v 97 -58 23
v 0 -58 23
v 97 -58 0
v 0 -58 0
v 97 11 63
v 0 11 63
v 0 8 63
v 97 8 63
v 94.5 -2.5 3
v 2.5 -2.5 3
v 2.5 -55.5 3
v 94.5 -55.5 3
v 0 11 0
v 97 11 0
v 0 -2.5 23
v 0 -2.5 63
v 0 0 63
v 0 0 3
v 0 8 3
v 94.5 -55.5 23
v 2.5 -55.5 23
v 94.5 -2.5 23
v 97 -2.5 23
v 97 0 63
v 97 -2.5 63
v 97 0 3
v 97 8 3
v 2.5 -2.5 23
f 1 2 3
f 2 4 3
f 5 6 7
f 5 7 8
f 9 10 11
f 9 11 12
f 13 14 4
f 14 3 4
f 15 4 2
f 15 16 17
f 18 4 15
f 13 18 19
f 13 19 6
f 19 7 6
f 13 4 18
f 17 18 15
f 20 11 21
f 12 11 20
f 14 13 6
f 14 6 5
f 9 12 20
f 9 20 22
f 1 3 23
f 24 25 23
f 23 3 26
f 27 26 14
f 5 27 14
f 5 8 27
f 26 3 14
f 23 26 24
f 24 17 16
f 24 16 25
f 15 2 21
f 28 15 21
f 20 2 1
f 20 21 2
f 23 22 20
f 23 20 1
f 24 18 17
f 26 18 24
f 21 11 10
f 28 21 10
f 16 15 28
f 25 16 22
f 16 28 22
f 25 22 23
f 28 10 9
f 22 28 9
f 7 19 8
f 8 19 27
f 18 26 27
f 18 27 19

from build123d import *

# Parameters (mm, degrees)
F0_W     = 97
F0_H     = 58
F1_DEPTH = 3
F2_W     = 97
F2_H     = 58
F2_W_2   = 92
F2_H_2   = 53
F3_DEPTH = 20
F4_W     = 97
F4_H     = 3
F5_DEPTH = 11
F6_W     = 97
F6_H     = 2.5
F7_DEPTH = 40
F8_W     = 97
F8_H     = 3
F9_DEPTH = 60


with BuildPart() as f1:
    # F0 (on Top) → F1 (new body)
    with BuildSketch(Plane.XY):
        with Locations((48.5, -29)):
            Rectangle(F0_W, F0_H)
    extrude(amount=F1_DEPTH)

    # F2 (on face) → F3 (join)
    with BuildSketch(Plane.XY.offset(3)):
        with Locations((48.5, -29)):
            Rectangle(F2_W, F2_H)
        with Locations((48.5, -29)):
            Rectangle(F2_W_2, F2_H_2, mode=Mode.SUBTRACT)
    extrude(amount=F3_DEPTH)

    # F4 (on face) → F5 (join)
    with BuildSketch(Plane(origin=(0, 0, 0), x_dir=(-1, 0, 0), z_dir=(0, 1, 0))):
        with Locations((-48.5, 1.5)):
            Rectangle(F4_W, F4_H)
    extrude(amount=F5_DEPTH)

    # F6 (on face) → F7 (join)
    with BuildSketch(Plane.XY.offset(23)):
        with Locations((48.5, -1.25)):
            Rectangle(F6_W, F6_H)
    extrude(amount=F7_DEPTH)

    # F8 (on face) → F9 (join, through all)
    with BuildSketch(Plane.XY.offset(3)):
        with Locations((48.5, 9.5)):
            Rectangle(F8_W, F8_H)
    extrude(amount=F9_DEPTH)


solid = f1.part
